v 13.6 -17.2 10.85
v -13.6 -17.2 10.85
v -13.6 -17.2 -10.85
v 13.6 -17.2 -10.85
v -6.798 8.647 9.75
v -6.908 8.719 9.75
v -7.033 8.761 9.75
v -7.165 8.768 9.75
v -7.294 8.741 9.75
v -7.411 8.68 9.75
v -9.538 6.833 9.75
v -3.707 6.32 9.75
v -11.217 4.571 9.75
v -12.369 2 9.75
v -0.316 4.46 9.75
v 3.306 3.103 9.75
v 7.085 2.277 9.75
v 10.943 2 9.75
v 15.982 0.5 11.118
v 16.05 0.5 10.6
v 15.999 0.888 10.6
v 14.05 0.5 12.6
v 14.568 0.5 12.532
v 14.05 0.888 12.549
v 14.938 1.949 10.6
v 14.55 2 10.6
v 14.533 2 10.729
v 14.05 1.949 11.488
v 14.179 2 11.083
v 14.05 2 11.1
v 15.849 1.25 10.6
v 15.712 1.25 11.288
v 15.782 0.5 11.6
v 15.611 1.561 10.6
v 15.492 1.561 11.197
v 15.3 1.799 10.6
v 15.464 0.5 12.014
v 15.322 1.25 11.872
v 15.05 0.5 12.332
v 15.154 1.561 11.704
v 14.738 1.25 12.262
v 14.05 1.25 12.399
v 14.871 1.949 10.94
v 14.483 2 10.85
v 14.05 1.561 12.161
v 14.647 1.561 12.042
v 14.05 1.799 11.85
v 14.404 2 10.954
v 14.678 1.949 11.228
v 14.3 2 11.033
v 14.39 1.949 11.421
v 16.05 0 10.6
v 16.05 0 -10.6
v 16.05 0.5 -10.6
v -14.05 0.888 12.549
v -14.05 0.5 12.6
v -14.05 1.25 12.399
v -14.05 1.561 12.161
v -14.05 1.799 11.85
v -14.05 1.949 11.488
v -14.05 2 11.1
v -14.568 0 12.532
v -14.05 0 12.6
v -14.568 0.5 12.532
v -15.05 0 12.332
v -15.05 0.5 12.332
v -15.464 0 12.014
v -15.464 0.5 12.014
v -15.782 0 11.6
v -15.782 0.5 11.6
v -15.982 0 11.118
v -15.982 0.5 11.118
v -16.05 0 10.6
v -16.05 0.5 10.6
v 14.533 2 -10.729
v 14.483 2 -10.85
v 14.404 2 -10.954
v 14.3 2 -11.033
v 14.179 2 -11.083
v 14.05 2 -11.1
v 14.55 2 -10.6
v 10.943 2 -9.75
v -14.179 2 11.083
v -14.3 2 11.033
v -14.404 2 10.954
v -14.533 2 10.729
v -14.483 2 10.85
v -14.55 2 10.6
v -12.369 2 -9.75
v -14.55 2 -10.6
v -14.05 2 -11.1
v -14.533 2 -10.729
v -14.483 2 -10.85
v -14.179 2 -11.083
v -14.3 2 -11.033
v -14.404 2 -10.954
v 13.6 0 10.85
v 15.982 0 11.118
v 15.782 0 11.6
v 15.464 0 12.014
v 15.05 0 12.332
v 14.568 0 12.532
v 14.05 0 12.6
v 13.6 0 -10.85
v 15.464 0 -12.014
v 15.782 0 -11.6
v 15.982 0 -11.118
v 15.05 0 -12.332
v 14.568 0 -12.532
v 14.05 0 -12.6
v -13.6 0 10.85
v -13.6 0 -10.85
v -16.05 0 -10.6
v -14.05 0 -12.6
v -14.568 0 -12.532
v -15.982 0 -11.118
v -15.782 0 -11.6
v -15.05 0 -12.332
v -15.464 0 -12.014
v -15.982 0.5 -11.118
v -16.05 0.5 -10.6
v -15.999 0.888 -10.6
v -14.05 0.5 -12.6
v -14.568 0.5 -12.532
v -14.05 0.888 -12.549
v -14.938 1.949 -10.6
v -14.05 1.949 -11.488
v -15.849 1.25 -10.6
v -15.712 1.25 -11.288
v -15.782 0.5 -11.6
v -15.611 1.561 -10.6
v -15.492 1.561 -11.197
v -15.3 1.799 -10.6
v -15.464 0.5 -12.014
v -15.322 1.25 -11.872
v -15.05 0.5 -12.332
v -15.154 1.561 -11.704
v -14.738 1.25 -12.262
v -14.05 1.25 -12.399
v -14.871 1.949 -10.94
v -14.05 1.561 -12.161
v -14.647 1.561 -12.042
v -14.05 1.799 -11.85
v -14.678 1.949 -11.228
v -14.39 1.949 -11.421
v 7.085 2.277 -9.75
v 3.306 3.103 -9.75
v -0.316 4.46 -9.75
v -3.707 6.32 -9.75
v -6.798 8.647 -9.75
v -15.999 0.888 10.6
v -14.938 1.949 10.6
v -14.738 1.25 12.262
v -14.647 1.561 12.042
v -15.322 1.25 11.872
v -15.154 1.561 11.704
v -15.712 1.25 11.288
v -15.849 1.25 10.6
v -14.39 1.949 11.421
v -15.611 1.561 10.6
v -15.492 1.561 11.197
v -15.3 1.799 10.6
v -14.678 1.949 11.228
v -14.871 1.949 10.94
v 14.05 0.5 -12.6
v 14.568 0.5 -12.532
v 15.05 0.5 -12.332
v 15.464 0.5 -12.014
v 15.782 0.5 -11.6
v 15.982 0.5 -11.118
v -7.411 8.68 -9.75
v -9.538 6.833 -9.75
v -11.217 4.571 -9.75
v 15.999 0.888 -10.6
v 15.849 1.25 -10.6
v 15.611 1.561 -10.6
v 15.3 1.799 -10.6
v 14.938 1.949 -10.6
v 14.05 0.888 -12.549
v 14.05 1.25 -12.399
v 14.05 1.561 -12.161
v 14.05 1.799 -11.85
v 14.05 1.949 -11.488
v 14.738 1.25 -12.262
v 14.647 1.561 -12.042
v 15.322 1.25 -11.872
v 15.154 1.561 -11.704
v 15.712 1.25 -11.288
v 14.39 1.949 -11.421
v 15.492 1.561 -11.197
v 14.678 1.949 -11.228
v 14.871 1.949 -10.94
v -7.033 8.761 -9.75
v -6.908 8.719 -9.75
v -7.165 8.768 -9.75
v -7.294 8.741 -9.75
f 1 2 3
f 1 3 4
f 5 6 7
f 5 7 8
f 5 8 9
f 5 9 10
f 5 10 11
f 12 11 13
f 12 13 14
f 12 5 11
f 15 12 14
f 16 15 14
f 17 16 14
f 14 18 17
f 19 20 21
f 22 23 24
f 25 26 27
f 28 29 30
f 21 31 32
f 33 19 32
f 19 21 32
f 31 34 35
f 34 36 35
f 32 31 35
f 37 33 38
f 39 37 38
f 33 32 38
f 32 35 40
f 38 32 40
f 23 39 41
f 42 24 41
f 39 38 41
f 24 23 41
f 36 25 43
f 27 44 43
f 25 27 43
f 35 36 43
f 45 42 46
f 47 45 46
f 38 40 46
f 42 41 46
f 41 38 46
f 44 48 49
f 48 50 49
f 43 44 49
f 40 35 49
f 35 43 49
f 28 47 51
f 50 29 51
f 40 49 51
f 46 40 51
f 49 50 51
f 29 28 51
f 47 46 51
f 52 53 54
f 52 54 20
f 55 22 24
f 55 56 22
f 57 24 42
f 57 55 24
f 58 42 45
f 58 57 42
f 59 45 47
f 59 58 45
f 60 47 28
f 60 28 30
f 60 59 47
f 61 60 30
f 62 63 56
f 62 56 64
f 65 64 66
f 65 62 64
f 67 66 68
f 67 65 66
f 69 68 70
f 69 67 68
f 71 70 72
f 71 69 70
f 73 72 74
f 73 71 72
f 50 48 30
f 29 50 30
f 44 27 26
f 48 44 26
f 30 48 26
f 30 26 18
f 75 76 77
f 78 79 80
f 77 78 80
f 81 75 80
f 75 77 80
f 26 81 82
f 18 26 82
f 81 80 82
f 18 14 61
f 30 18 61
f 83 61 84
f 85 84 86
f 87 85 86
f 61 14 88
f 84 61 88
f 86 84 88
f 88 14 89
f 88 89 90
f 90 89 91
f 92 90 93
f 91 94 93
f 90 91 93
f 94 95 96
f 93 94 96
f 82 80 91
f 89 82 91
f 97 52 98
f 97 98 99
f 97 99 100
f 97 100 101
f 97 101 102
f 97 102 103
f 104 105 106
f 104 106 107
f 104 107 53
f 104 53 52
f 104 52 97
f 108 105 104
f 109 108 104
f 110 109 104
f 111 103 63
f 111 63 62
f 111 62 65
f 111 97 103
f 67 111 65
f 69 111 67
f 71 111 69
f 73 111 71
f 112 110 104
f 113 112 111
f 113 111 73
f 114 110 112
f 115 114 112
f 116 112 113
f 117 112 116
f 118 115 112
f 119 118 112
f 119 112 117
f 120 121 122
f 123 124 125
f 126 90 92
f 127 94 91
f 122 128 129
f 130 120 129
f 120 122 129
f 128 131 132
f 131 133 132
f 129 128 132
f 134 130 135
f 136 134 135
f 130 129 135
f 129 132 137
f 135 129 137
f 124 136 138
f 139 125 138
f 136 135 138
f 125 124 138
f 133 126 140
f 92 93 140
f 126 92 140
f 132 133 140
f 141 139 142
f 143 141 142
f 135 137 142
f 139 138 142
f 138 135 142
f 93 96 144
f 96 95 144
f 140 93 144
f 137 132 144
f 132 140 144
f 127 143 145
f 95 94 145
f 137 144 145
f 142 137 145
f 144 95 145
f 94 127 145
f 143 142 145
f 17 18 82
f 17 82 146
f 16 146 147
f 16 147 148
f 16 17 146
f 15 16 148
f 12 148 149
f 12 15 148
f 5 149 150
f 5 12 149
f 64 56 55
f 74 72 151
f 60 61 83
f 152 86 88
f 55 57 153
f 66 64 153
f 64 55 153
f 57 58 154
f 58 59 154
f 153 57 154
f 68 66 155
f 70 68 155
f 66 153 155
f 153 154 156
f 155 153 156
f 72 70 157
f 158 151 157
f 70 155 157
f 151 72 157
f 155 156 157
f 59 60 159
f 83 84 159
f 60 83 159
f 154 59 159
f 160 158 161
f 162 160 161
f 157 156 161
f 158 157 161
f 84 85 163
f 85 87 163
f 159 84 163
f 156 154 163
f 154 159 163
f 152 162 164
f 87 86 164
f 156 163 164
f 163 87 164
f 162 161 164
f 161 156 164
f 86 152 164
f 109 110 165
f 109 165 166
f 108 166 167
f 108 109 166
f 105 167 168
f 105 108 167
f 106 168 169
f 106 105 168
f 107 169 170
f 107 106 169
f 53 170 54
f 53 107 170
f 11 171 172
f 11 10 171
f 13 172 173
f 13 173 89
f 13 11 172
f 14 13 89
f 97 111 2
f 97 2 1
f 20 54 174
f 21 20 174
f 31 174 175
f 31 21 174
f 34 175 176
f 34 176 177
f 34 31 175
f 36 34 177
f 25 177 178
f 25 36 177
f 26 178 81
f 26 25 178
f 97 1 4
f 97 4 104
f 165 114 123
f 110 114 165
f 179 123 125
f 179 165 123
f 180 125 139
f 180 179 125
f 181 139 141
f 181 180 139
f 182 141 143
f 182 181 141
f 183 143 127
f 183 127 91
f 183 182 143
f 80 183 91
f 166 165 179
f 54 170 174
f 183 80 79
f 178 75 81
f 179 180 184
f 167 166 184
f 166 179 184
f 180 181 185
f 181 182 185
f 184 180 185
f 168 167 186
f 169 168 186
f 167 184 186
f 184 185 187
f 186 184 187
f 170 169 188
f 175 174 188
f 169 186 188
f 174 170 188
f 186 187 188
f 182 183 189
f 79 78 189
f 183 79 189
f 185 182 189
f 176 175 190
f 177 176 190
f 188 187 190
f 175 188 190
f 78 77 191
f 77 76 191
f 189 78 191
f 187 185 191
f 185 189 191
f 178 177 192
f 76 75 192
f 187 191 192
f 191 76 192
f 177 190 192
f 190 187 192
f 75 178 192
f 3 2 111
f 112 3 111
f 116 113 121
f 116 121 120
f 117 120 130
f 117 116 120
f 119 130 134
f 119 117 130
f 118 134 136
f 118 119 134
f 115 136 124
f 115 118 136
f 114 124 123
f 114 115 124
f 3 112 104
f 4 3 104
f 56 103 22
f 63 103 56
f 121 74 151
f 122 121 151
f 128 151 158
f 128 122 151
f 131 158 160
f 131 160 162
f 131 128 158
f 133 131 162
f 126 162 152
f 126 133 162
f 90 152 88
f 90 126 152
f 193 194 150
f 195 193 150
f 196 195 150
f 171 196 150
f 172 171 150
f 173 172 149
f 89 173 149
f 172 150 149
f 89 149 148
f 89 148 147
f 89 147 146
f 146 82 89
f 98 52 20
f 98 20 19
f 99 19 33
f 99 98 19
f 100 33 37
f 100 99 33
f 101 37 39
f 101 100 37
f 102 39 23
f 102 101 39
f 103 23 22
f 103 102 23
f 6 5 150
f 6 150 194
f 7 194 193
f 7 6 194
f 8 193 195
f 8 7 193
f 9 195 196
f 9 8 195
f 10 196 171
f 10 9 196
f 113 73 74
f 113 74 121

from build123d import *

# Parameters (mm, degrees)
BOSS_EXTRUDE1_DEPTH = 2
FILLET1_R           = 1.5
BOSS_EXTRUDE2_DEPTH = 9.75
SKETCH4_W           = 27.2
SKETCH4_H           = 17.2
BOSS_EXTRUDE3_DEPTH = 10.85


with BuildPart() as part:
    # Sketch1 → Boss-Extrude1 (new body)
    with BuildSketch(Plane(origin=(0, 0, 0), x_dir=(1, 0, 0), z_dir=(0, 1, 0))):
        with BuildLine():
            Line((-14.05, 12.6), (14.05, 12.6))
            ThreePointArc((14.05, 12.6), (15.464213562, 12.014213562), (16.05, 10.6))
            Line((16.05, 10.6), (16.05, -10.6))
            ThreePointArc((16.05, -10.6), (15.464213562, -12.014213562), (14.05, -12.6))
            Line((14.05, -12.6), (-14.05, -12.6))
            ThreePointArc((-14.05, -12.6), (-15.464213562, -12.014213562), (-16.05, -10.6))
            Line((-16.05, -10.6), (-16.05, 10.6))
            ThreePointArc((-16.05, 10.6), (-15.464213562, 12.014213562), (-14.05, 12.6))
        make_face()
    extrude(amount=BOSS_EXTRUDE1_DEPTH)

    # Fillet1
    fillet1_edges = [part.edges().sort_by_distance(p)[0] for p in [
        (-15.464213562, 2, -12.014213562),
        (-16.05, 2, 0),
        (-15.464213562, 2, 12.014213562),
        (0, 2, 12.6),
        (15.464213562, 2, 12.014213562),
        (16.05, 2, 0),
        (15.464213562, 2, -12.014213562),
        (0, 2, -12.6),
    ]]
    fillet(fillet1_edges, radius=FILLET1_R)

    # Sketch3 → Boss-Extrude2 (add, symmetric)
    with BuildSketch(Plane.XY):
        with BuildLine():
            Line((-12.369316877, 2), (10.942988923, 2))
            ThreePointArc((10.942988923, 2), (1.470491732, 3.716175191), (-6.79782289, 8.646533558))
            ThreePointArc((-6.79782289, 8.646533558), (-7.098799524, 8.768857552), (-7.4114107, 8.680402213))
            ThreePointArc((-7.4114107, 8.680402213), (-10.439168516, 5.747500287), (-12.369316877, 2))
        make_face()
    extrude(amount=BOSS_EXTRUDE2_DEPTH, both=True)

    # Sketch4 → Boss-Extrude3 (add, symmetric)
    with BuildSketch(Plane.XY):
        with Locations((0, -8.6)):
            Rectangle(SKETCH4_W, SKETCH4_H)
    extrude(amount=BOSS_EXTRUDE3_DEPTH, both=True)


solid = part.part
